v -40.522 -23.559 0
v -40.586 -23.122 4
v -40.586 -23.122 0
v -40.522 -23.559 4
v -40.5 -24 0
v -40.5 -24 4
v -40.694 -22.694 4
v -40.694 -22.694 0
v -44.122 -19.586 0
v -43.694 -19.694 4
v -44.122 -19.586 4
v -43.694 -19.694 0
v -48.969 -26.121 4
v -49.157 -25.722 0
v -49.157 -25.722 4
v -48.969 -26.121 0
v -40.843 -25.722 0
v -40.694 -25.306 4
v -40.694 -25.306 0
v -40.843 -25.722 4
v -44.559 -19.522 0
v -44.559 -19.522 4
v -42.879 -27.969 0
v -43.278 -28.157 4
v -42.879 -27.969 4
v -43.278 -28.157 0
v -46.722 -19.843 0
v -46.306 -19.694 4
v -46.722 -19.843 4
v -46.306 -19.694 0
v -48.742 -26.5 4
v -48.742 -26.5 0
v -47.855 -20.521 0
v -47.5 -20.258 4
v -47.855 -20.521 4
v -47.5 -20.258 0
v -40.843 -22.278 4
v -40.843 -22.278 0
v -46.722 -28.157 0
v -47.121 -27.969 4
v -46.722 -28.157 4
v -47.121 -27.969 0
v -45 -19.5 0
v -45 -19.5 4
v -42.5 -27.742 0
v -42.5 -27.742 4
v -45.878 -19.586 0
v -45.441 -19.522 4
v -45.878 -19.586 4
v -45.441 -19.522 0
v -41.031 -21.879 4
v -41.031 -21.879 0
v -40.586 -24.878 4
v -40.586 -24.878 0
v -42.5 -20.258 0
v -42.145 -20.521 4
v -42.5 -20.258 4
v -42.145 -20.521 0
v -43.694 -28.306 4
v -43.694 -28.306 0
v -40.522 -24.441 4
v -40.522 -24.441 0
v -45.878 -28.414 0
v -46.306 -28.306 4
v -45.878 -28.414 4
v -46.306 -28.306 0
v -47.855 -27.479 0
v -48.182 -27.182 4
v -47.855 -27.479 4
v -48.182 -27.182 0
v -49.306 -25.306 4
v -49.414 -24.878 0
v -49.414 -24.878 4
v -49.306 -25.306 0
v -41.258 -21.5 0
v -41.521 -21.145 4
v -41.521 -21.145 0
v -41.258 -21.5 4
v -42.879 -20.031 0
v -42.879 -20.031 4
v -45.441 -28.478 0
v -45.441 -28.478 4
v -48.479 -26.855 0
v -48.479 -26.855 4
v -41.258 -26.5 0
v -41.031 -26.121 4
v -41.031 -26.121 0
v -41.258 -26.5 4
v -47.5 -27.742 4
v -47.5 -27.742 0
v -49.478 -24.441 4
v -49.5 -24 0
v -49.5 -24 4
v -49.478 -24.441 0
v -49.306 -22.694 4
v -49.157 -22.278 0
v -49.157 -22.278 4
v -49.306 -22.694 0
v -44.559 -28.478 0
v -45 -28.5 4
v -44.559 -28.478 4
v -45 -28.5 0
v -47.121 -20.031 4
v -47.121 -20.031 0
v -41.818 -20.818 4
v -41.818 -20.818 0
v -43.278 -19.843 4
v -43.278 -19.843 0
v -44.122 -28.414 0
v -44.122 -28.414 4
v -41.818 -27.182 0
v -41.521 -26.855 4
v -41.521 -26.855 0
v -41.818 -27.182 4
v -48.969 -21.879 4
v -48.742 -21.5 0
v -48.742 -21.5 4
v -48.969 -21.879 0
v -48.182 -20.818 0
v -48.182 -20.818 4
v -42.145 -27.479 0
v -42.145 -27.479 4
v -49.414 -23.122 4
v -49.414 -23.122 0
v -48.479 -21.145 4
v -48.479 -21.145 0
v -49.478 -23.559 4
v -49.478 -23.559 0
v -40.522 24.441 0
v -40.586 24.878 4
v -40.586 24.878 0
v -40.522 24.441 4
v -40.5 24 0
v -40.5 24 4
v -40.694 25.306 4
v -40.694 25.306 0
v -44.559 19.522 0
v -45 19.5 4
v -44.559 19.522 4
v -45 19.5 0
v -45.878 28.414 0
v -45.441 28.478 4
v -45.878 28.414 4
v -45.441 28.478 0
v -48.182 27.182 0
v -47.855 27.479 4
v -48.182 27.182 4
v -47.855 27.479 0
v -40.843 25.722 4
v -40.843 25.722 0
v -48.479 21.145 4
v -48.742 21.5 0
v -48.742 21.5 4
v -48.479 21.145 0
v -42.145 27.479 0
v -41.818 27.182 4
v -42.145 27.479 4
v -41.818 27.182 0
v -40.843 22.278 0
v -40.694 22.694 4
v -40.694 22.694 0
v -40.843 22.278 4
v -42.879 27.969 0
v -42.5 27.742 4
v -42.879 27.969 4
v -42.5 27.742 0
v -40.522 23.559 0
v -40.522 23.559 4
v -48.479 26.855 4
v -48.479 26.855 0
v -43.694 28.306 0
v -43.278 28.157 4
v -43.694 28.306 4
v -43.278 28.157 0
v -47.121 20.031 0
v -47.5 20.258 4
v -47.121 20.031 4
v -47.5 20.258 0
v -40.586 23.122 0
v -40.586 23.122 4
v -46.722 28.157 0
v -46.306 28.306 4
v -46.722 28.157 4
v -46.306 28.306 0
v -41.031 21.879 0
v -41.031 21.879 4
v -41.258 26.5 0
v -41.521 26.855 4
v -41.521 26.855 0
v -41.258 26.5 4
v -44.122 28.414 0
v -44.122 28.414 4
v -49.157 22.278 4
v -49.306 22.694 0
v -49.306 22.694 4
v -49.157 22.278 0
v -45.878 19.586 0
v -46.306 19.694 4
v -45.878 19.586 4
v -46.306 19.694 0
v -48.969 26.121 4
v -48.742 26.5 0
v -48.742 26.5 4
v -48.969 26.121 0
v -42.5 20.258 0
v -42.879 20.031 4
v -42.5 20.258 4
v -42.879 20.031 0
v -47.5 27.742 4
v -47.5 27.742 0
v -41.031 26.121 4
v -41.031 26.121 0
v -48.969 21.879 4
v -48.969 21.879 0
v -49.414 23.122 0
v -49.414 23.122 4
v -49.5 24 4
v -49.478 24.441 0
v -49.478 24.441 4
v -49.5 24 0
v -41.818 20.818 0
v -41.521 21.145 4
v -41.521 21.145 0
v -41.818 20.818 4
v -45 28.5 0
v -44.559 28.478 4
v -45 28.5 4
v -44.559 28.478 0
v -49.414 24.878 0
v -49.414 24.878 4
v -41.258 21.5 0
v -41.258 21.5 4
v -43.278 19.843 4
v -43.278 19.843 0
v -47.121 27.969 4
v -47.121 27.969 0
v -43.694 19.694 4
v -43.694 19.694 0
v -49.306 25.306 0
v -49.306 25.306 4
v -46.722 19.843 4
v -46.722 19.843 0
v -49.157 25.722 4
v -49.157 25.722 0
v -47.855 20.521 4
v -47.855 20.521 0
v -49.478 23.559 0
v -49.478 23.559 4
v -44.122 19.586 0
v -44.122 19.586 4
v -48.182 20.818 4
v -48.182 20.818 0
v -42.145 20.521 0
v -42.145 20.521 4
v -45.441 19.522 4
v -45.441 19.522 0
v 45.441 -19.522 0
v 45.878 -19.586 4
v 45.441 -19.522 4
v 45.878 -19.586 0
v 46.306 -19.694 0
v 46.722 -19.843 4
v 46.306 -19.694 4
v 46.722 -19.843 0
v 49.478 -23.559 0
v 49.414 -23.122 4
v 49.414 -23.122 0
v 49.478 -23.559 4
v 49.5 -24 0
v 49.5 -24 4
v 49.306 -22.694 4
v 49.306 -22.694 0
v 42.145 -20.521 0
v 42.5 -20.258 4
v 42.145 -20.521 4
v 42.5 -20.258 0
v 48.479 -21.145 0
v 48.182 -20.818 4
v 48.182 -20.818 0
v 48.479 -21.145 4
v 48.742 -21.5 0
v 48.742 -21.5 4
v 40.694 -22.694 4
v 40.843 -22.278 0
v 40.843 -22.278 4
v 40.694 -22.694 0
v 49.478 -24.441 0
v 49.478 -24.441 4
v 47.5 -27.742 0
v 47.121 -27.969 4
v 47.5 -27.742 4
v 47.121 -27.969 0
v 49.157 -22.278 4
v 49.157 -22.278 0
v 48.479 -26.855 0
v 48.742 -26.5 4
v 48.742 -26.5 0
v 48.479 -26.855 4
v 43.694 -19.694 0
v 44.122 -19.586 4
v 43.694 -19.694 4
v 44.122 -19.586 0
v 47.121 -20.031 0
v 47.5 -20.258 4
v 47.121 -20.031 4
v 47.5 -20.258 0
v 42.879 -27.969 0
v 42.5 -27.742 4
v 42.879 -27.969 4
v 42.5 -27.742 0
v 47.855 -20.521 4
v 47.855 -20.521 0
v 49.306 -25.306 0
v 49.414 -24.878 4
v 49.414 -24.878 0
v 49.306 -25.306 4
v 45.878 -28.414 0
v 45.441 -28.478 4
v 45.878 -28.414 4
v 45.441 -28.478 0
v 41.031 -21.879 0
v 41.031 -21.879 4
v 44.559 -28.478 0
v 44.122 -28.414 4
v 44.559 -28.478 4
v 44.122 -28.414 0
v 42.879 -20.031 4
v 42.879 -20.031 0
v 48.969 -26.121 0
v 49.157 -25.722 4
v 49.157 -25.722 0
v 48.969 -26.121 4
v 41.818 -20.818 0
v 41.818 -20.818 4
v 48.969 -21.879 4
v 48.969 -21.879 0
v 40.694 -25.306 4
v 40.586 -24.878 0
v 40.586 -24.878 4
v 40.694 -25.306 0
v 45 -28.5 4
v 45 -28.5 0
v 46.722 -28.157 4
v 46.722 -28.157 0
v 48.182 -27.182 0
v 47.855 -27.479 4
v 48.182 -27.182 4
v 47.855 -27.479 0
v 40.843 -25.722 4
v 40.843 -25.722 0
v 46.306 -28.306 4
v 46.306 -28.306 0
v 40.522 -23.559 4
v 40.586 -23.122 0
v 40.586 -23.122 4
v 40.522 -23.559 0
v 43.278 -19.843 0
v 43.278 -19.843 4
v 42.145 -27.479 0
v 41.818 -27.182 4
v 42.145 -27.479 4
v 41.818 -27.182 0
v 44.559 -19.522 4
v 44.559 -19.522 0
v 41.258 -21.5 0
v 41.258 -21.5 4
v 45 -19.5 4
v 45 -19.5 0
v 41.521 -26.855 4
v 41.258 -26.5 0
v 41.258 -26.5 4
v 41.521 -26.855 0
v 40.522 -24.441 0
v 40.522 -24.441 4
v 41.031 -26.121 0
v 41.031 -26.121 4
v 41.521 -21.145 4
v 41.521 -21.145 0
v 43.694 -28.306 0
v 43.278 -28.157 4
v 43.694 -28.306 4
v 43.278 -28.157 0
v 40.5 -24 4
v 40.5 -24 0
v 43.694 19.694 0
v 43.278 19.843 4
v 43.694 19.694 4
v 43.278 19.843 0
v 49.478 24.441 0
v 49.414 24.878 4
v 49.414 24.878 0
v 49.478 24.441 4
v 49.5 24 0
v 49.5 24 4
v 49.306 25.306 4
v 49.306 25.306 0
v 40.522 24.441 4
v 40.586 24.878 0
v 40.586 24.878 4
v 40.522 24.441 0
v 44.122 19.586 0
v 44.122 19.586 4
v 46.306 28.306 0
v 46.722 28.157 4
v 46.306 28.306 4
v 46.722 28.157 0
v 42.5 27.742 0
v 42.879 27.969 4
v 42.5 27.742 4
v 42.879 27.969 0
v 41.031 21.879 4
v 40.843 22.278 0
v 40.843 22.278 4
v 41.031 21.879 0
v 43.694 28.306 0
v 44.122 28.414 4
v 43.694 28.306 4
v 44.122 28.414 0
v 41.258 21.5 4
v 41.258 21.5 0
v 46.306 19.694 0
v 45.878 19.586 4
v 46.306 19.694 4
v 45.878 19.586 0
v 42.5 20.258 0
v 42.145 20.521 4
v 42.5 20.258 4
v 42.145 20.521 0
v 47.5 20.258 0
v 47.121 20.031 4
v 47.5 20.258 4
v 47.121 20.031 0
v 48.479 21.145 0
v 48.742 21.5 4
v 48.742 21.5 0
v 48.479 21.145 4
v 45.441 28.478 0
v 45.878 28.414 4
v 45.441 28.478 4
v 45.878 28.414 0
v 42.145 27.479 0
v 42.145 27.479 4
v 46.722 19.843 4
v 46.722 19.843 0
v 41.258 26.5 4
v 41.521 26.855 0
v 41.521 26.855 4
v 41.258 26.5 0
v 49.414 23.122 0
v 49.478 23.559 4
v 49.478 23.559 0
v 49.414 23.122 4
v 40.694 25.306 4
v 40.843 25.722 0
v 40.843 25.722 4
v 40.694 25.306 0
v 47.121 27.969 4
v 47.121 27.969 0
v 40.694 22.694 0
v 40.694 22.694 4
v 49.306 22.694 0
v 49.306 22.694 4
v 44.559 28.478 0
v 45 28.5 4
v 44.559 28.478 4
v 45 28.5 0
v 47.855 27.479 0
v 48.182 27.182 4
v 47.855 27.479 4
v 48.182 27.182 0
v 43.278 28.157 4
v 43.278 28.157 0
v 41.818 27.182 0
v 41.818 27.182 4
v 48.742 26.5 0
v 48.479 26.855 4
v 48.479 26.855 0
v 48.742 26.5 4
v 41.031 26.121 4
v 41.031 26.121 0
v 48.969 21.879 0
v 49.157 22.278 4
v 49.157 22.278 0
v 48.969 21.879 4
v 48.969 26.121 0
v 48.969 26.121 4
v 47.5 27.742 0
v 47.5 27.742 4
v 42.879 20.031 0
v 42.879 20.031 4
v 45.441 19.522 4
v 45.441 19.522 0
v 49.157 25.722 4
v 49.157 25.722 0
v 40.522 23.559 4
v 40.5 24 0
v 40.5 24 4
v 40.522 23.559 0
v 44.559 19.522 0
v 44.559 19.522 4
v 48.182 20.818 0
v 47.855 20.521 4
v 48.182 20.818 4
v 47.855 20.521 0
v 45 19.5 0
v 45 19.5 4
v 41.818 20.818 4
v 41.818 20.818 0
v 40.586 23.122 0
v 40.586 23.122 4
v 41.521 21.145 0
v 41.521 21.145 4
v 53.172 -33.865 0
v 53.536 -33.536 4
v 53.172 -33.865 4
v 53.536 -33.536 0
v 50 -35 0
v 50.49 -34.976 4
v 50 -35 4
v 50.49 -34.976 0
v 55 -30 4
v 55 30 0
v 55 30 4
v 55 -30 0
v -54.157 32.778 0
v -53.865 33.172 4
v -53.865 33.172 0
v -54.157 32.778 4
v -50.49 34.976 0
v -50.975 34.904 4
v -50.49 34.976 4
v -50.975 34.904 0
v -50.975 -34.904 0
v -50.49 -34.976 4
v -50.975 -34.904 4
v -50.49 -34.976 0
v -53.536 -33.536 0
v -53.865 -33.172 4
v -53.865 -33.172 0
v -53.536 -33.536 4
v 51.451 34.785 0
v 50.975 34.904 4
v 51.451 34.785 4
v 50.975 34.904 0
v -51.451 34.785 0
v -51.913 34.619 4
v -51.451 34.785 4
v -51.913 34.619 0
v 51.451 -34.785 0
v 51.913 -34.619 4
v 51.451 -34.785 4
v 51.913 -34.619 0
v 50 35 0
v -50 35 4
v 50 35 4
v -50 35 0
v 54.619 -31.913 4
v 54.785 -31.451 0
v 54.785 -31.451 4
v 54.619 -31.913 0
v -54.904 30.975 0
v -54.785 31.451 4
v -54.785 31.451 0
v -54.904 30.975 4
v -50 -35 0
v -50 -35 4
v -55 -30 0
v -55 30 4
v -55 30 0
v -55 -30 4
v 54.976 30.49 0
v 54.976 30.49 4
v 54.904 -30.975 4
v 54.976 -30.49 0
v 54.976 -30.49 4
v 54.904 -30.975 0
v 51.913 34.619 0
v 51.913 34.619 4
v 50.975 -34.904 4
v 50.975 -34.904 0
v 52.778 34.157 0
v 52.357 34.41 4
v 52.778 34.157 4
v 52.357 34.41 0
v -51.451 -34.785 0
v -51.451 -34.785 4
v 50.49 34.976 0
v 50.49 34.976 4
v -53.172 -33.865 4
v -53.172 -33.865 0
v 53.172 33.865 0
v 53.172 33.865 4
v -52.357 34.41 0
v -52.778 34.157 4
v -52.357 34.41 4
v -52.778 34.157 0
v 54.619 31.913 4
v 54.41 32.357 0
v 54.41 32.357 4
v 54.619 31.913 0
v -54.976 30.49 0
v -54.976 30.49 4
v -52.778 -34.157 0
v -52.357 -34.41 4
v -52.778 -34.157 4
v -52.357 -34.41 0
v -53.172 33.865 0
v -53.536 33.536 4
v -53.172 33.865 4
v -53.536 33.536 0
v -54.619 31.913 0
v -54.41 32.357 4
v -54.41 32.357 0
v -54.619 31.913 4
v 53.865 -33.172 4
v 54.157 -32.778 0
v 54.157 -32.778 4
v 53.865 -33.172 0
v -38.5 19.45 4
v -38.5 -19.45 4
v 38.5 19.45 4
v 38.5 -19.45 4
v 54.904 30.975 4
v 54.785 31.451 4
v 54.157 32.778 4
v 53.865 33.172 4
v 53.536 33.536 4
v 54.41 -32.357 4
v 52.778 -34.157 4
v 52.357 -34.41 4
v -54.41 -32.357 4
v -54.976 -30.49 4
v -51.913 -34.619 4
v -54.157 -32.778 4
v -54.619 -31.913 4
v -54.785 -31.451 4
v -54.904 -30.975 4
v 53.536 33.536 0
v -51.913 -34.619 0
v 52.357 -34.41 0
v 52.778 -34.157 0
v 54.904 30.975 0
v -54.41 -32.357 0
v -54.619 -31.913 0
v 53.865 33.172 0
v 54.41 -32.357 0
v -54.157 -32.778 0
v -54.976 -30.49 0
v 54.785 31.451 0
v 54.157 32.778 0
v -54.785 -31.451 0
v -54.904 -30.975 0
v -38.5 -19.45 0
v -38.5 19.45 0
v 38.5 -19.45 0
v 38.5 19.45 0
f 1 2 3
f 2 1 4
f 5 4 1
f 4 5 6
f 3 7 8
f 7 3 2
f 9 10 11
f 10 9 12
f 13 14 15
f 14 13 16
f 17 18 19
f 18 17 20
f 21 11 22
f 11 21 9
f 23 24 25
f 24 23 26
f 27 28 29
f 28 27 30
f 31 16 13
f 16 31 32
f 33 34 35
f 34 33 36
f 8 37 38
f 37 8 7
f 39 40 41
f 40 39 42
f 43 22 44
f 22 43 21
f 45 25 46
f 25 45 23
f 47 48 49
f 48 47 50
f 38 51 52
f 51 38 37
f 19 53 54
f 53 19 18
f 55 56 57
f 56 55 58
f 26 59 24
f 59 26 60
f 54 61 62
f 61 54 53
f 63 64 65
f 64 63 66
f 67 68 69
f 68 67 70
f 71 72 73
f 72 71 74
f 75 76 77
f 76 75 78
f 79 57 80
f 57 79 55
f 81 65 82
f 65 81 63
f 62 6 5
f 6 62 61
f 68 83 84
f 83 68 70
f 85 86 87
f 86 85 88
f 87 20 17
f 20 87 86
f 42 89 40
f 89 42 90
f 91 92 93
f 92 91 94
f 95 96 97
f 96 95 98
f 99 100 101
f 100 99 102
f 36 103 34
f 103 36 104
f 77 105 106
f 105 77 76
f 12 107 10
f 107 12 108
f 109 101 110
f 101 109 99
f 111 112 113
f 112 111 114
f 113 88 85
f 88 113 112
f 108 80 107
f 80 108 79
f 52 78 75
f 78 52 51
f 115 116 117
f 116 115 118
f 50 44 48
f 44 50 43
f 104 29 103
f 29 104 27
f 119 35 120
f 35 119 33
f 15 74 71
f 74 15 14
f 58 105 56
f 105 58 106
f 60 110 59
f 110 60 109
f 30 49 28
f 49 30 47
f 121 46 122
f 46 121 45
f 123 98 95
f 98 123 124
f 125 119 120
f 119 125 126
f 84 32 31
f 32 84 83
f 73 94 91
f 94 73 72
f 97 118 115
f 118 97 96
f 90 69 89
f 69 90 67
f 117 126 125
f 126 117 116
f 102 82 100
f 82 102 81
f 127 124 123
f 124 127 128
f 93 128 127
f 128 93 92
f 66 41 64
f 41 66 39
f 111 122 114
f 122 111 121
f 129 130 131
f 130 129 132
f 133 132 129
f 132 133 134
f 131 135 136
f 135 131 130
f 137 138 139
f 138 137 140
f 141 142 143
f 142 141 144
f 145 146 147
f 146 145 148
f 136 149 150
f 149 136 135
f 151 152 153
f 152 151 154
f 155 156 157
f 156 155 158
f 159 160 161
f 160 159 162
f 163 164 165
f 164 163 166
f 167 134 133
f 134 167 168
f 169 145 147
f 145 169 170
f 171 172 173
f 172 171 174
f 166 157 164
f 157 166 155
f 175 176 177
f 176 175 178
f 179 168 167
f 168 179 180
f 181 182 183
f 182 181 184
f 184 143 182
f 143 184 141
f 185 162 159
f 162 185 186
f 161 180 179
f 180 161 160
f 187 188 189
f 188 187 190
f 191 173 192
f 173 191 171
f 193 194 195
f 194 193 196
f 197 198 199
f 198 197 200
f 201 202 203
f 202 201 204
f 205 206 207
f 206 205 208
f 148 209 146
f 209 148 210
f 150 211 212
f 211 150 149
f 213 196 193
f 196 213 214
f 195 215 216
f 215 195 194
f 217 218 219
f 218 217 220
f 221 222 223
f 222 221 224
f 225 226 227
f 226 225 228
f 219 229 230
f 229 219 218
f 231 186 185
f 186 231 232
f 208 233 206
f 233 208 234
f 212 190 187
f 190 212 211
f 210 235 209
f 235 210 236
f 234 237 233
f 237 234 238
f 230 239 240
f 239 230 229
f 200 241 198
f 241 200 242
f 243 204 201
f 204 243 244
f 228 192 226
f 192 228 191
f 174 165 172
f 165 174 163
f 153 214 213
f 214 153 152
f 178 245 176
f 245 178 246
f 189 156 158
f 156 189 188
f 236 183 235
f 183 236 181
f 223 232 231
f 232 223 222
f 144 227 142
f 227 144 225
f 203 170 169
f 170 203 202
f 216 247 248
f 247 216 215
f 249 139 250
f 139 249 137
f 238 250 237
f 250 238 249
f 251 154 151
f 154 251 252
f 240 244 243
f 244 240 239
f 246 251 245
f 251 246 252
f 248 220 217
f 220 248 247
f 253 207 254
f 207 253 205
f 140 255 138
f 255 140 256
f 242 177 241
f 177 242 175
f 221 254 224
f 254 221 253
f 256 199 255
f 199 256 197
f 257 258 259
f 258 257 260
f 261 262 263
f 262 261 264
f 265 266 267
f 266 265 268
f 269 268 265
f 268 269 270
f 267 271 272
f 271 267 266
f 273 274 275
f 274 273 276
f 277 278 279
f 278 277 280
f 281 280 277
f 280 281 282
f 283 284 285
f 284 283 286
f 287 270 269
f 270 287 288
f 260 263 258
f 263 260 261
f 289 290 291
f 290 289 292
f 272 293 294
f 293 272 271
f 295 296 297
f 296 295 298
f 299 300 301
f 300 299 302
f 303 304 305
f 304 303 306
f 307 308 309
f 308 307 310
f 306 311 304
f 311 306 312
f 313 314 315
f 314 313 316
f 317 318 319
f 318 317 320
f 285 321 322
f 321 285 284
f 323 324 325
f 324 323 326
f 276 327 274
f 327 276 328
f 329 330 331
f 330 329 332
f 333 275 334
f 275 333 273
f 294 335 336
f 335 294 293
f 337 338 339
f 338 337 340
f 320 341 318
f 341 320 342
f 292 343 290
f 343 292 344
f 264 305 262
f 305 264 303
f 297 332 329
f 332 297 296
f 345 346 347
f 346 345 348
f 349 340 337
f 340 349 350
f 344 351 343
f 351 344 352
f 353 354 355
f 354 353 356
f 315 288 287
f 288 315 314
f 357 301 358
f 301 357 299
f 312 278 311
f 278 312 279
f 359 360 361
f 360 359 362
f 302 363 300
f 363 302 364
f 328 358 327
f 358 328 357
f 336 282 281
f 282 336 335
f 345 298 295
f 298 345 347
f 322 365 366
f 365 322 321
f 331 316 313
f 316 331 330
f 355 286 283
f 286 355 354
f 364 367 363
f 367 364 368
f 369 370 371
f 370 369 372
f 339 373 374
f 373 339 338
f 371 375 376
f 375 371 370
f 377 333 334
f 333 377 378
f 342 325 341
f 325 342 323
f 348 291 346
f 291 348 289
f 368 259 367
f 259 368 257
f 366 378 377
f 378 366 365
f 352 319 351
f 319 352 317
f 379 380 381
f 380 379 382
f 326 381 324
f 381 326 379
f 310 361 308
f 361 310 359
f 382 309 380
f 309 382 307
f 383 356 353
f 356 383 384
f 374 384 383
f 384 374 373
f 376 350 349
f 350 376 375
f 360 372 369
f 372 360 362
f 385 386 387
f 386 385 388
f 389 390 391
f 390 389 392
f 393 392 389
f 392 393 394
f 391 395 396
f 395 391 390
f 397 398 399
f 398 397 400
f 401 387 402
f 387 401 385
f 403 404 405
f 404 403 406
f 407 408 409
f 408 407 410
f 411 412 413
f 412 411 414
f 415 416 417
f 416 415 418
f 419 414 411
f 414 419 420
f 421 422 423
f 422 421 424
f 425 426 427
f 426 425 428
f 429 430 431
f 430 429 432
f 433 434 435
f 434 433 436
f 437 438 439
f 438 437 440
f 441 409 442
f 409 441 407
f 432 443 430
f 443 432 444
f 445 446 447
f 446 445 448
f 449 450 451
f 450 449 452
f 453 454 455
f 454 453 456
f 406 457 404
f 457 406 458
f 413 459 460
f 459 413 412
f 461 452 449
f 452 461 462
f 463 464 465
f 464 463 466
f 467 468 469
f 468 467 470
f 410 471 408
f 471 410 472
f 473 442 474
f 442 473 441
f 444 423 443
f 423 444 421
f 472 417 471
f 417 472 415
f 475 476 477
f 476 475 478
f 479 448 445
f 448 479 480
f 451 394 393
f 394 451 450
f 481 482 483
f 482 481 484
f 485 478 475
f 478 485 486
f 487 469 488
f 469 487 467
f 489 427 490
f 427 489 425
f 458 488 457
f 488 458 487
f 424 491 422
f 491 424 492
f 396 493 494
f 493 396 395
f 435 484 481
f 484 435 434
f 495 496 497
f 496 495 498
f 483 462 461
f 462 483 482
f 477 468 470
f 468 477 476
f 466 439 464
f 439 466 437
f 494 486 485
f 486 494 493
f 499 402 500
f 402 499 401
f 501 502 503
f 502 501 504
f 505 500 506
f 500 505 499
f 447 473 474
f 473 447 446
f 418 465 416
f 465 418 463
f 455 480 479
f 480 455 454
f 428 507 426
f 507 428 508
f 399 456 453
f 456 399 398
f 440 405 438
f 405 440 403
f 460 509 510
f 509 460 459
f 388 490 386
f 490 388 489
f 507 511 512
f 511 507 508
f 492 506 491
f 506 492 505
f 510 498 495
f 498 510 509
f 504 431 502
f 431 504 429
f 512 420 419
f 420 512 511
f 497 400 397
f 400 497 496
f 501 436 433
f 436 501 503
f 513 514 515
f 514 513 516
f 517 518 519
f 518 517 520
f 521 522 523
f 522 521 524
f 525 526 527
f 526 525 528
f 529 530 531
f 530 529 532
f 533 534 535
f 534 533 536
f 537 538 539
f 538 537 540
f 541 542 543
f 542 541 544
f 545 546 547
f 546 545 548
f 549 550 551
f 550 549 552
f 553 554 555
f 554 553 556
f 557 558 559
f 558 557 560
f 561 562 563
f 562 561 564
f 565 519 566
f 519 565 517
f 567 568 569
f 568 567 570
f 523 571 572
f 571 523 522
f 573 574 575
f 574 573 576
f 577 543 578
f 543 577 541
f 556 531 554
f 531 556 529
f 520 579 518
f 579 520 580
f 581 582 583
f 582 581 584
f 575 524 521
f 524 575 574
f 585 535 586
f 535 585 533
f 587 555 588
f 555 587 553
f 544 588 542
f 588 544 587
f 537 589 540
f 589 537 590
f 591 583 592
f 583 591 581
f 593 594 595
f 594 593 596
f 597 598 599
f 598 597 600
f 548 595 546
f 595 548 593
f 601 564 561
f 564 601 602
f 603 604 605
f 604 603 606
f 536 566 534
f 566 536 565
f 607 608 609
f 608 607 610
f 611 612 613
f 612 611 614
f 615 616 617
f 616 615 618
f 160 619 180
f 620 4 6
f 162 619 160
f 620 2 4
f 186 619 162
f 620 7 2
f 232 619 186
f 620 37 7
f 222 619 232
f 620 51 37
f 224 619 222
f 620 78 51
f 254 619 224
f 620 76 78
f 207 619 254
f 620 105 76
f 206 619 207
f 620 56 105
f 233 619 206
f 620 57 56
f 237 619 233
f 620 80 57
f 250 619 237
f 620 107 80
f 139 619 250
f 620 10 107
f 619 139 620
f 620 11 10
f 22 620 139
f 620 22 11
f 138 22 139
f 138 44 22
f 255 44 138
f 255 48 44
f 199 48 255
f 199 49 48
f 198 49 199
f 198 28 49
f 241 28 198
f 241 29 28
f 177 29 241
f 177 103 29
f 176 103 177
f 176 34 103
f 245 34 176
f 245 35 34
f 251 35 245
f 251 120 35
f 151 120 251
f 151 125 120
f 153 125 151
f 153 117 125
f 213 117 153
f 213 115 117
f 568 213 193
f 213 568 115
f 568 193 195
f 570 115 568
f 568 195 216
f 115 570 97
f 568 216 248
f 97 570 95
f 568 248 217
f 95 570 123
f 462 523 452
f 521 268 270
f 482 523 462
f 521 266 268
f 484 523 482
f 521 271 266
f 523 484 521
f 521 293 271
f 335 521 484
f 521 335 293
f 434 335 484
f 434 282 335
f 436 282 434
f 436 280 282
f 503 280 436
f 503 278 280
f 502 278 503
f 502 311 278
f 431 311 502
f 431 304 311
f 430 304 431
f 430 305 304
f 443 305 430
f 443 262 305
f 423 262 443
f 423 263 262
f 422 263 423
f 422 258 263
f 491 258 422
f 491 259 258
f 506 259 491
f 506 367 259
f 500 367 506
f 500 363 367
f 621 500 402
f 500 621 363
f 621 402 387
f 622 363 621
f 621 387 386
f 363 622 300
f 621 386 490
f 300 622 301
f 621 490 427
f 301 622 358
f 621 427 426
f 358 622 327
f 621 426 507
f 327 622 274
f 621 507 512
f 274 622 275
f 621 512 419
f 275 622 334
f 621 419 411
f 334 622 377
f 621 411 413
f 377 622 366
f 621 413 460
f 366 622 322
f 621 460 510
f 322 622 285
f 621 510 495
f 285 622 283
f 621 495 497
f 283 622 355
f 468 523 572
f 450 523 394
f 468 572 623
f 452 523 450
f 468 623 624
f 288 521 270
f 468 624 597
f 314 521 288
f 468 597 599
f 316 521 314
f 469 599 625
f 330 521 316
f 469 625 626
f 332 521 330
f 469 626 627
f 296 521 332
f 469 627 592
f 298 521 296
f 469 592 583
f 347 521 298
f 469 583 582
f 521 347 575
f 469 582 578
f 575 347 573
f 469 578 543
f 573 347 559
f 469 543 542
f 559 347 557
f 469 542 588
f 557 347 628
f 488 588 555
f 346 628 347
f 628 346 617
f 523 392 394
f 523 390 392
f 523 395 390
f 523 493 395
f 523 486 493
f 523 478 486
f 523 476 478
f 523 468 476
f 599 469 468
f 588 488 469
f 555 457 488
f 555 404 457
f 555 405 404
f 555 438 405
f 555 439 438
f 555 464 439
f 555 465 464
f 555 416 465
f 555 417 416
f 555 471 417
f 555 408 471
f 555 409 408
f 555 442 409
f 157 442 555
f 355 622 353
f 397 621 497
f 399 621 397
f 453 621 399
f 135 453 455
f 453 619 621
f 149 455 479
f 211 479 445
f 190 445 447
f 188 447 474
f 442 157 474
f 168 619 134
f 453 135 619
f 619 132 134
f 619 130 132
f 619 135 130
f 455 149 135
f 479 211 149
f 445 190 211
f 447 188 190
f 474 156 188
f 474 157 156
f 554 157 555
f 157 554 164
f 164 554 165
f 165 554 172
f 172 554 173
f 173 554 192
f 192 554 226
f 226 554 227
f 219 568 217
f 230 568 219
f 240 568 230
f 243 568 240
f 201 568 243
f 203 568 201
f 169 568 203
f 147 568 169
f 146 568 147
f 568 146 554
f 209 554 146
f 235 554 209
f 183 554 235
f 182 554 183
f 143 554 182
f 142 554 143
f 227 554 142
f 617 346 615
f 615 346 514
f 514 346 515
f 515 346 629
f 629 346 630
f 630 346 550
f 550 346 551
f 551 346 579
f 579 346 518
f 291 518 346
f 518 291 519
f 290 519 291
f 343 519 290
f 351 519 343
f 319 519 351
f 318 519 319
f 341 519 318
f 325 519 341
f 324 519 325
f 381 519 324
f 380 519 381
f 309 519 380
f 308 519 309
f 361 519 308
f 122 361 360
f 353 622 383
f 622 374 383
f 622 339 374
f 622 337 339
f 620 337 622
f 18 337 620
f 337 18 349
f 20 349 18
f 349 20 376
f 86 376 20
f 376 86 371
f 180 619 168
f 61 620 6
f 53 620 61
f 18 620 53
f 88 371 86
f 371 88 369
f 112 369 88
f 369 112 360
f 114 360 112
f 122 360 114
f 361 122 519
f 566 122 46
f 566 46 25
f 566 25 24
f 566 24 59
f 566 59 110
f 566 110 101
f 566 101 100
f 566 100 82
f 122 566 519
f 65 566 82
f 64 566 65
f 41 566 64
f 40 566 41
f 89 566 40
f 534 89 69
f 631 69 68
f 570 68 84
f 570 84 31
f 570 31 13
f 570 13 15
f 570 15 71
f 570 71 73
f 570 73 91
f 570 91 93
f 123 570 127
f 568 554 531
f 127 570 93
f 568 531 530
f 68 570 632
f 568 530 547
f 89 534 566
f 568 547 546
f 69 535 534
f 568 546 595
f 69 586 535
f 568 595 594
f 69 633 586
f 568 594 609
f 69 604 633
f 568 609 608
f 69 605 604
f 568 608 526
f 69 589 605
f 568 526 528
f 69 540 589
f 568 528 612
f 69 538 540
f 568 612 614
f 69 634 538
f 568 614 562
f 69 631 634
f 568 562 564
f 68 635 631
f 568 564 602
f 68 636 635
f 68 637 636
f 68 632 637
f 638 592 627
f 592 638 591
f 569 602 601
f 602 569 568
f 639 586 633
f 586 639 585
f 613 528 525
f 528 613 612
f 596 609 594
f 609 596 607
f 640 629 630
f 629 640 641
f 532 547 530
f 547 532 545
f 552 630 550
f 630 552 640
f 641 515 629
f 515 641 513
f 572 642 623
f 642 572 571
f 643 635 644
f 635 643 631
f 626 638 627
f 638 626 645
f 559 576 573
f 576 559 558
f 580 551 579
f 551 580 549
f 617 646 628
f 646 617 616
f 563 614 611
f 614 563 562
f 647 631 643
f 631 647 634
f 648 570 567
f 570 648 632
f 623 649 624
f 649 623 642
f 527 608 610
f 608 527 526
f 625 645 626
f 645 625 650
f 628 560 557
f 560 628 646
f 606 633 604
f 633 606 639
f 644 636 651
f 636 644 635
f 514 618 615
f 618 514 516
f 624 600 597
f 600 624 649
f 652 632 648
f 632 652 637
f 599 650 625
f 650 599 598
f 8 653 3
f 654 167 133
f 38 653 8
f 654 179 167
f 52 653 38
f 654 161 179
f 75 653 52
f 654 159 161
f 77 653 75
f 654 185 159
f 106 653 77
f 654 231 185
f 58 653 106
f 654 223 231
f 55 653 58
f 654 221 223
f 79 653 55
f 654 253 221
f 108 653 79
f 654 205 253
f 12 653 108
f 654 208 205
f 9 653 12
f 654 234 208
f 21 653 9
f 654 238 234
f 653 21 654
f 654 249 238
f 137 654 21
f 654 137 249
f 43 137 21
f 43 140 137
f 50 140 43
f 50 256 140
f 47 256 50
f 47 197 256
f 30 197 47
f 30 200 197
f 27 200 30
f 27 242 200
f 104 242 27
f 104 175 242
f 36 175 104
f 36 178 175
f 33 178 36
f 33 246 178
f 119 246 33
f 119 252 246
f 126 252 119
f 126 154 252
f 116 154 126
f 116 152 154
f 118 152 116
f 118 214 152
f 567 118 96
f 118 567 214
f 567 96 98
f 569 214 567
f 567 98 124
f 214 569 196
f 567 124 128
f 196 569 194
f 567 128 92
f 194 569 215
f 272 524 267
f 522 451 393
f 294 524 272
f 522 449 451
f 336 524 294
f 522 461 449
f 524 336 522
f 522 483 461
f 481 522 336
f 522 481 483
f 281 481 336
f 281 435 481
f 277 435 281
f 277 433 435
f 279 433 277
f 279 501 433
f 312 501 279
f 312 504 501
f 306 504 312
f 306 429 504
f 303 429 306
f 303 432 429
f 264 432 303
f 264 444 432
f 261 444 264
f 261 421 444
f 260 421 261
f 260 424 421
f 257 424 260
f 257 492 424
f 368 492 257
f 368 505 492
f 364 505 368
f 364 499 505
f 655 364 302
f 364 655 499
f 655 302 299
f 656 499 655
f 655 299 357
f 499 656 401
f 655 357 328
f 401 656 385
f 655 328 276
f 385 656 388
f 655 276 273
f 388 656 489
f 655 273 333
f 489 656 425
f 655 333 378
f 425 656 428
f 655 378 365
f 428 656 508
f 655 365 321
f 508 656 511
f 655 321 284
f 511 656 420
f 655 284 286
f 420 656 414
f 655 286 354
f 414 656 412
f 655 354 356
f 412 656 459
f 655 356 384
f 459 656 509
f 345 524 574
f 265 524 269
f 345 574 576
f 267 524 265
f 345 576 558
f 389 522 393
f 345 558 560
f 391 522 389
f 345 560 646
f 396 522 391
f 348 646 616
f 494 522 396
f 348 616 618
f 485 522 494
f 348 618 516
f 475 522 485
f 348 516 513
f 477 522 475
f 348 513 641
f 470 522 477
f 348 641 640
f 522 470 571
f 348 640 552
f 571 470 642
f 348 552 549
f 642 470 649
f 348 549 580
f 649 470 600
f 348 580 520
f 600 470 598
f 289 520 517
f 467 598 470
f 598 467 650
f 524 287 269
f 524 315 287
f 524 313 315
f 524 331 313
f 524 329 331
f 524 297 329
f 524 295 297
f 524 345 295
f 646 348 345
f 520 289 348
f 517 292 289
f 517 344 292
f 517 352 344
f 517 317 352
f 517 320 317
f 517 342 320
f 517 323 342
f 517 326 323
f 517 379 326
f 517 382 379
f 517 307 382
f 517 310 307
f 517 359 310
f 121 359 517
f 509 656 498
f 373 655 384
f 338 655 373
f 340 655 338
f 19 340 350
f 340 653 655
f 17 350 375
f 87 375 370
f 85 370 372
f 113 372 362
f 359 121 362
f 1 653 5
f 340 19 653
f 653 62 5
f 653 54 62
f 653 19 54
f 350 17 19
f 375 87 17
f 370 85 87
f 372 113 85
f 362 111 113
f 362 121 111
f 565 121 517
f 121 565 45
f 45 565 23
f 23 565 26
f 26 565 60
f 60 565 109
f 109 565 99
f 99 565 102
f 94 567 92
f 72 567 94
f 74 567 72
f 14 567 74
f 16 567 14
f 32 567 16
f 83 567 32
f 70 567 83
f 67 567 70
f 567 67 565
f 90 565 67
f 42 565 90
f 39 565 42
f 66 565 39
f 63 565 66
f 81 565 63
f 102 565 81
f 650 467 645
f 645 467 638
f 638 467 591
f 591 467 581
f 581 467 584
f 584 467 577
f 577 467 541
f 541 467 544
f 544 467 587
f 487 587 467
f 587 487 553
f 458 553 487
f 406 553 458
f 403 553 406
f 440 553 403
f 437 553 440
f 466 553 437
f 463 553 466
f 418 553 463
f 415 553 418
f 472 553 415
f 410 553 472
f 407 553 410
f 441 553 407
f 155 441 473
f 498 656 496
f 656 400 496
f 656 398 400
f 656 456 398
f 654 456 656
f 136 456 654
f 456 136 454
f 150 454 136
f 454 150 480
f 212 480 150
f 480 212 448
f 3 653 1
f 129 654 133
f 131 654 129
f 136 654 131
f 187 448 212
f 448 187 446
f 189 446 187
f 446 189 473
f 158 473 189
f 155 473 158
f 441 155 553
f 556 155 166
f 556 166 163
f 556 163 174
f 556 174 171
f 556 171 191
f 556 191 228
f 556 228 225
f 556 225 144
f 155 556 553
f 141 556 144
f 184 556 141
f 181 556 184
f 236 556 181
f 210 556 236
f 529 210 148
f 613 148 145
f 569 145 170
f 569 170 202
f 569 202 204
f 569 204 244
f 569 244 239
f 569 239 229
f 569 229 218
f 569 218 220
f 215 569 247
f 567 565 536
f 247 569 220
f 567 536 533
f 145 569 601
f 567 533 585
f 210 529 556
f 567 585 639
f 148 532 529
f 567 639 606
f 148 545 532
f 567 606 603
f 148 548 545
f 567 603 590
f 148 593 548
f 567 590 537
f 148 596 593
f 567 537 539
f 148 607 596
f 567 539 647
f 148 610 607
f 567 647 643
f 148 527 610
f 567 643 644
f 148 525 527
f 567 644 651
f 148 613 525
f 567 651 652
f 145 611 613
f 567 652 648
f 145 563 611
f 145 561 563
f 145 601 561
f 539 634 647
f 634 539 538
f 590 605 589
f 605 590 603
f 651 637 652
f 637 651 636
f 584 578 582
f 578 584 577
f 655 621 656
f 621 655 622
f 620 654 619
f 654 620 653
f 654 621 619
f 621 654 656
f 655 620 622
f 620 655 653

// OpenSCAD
// file: common.scad
// Shared dimensions in mm; FDM fit allowances are design choices, not tolerances
// guaranteed by vendors. Exact mower model/serial and printer remain unknown.
// 76.2 x 38.1 rectangular rail is an UNVERIFIED selected envelope, not a
// specification for all TimeCutters (Toro also sells C-channel frames).
$fn = 64;
frame_rail_w = 76.2;                // depth wrapped by square U-bolt
frame_rail_h = 38.1;                // contact face width between U-bolt legs
frame_ubolt_inside_w = 40;
frame_ubolt_leg_nominal_d = 8;
frame_ubolt_center_pitch = frame_ubolt_inside_w + frame_ubolt_leg_nominal_d;
frame_ubolt_leg_hole_d = 9;
frame_ubolt_backing_t = 3;
frame_ubolt_washer_t = 2.4;
frame_ubolt_nut_h = 8;
frame_ubolt_thread_projection = 3;  // beyond full nut, not a second nut engagement
// Four-bolt printed steering-bar clamp. The 25.4 mm tube is only a coupon default;
// measure the actual lap-bar tube and tune its fit before printing working clamps.
clamp_tube_od_mm = 25.4;
clamp_tube_clearance_mm = 0.4;
clamp_shell_mm = 10;
clamp_bolt_x_mm = 18;
clamp_bolt_clear_mm = 5.5;          // four M5 clamp bolts
clamp_nut_af_mm = 8.2;
clamp_nut_depth_mm = 4.8;
clamp_pin_bore_mm = 6.6;
clamp_rod_eye_length_mm = 32;
clamp_rod_eye_width_mm = 20;
clamp_rod_eye_t_mm = 8;             // printed single-eye lug thickness
clamp_rod_gap_mm = 9;               // yoke clearance around the eye, nominally 0.5 mm per side
clamp_yoke_span_mm = 42;            // ear width clears the eye through its planar sweep
clamp_yoke_reach_mm = 42;           // total outboard yoke extension from the clamp body
clamp_yoke_root_overlap_mm = 4;     // fuse each printed ear into its half beyond the bar opening
clamp_yoke_sweep_clearance_mm = 1;
clamp_gauge_wall_mm = 5;
clamp_r_mm = (clamp_tube_od_mm + clamp_tube_clearance_mm) / 2;
clamp_half_h_mm = clamp_r_mm + clamp_shell_mm;
clamp_bolt_y_mm = clamp_r_mm + 7;
clamp_w_mm = 2 * (clamp_bolt_y_mm + clamp_shell_mm);
clamp_l_mm = 2 * (clamp_bolt_x_mm + 7);
clamp_gauge_index = 1;

function clamp_rod_eye_sweep_radius_mm() =
    sqrt(pow(clamp_rod_eye_length_mm/2, 2) + pow(clamp_rod_eye_width_mm/2, 2));

// Exact listing's RDS51150 stationary-holder SIDE drawing, not bottom holes.
// RDS51150 vs purchased RDS51150SG revision must be confirmed with the coupon.
servo_side_hole_pitch = 24;
servo_side_hole_clear_d = 2.9;       // M2.5 with 0.4 mm diametral allowance
servo_side_tool_bore_d = 6;
m3_clear = 3.4;
m4_clear = 4.5;
m5_clear = 5.5;
m6_clear = 6.4;
m8_clear = 8.4;
wall = 5;
clearance = 0.4;

function frame_ubolt_required_leg_length(saddle_t) =
    frame_rail_w + saddle_t + frame_ubolt_backing_t + frame_ubolt_washer_t +
    frame_ubolt_nut_h + frame_ubolt_thread_projection;
function saddle_width(pitch, bore) = pitch + bore + 2 * wall;


module slot(d, len, h) {
    hull() for (x = [-len / 2, len / 2]) translate([x, 0, 0]) cylinder(h = h, d = d);
}
module plate(l, w, t, r = 6) {
    assert(l >= 2 * r && w >= 2 * r && t > 0);
    hull() for (x = [-1, 1], y = [-1, 1])
        translate([x * (l / 2 - r), y * (w / 2 - r), 0]) cylinder(h = t, r = r);
}
module frame_saddle(l, t, span, leg = frame_ubolt_leg_hole_d) {
    assert(l / 2 - span / 2 - leg / 2 >= 5, "U-bolt hole too near saddle end");
    plate(l, saddle_width(frame_ubolt_center_pitch, leg), t, 8);
}
module frame_ubolt_slots(t, span, leg = frame_ubolt_leg_hole_d) {
    for (x = [-1, 1], y = [-1, 1])
        translate([x * span / 2, y * frame_ubolt_center_pitch / 2, -1]) cylinder(h = t + 2, d = leg);
}
// main file
// Fit coupons for the retained E-stop frame interface and servo side pattern.
// Steering clamps now use lapbar_four_bolt_clamp.scad's measured-OD gauge;
// the previous round-U-bolt/V-seat gauges no longer apply to steering.
// gauge 1: selected rail cross-section and square-U-bolt pitch for E-stop only.
// gauge 2: RDS51150 fixed-holder SIDE 24x24 M2.5 pattern.
include <common.scad>
gauge = 1;

module actuation_fit_gauge() {
    if (gauge == 1) difference() {
        plate(110, 70, 4, 5);
        translate([0, 0, 2]) cube([frame_rail_w + 0.8, frame_rail_h + 0.8, 6], center = true);
        for (x = [-45, 45], y = [-24, 24])
            translate([x, y, -1]) cylinder(d = frame_ubolt_leg_hole_d, h = 6);
    }
    else if (gauge == 2) difference() {
        plate(38, 38, 3, 3);
        for (x = [-12, 12], y = [-12, 12])
            translate([x, y, -1]) cylinder(d = servo_side_hole_clear_d, h = 5);
    }
    else assert(false, "gauge must be 1 or 2");
}
actuation_fit_gauge();
